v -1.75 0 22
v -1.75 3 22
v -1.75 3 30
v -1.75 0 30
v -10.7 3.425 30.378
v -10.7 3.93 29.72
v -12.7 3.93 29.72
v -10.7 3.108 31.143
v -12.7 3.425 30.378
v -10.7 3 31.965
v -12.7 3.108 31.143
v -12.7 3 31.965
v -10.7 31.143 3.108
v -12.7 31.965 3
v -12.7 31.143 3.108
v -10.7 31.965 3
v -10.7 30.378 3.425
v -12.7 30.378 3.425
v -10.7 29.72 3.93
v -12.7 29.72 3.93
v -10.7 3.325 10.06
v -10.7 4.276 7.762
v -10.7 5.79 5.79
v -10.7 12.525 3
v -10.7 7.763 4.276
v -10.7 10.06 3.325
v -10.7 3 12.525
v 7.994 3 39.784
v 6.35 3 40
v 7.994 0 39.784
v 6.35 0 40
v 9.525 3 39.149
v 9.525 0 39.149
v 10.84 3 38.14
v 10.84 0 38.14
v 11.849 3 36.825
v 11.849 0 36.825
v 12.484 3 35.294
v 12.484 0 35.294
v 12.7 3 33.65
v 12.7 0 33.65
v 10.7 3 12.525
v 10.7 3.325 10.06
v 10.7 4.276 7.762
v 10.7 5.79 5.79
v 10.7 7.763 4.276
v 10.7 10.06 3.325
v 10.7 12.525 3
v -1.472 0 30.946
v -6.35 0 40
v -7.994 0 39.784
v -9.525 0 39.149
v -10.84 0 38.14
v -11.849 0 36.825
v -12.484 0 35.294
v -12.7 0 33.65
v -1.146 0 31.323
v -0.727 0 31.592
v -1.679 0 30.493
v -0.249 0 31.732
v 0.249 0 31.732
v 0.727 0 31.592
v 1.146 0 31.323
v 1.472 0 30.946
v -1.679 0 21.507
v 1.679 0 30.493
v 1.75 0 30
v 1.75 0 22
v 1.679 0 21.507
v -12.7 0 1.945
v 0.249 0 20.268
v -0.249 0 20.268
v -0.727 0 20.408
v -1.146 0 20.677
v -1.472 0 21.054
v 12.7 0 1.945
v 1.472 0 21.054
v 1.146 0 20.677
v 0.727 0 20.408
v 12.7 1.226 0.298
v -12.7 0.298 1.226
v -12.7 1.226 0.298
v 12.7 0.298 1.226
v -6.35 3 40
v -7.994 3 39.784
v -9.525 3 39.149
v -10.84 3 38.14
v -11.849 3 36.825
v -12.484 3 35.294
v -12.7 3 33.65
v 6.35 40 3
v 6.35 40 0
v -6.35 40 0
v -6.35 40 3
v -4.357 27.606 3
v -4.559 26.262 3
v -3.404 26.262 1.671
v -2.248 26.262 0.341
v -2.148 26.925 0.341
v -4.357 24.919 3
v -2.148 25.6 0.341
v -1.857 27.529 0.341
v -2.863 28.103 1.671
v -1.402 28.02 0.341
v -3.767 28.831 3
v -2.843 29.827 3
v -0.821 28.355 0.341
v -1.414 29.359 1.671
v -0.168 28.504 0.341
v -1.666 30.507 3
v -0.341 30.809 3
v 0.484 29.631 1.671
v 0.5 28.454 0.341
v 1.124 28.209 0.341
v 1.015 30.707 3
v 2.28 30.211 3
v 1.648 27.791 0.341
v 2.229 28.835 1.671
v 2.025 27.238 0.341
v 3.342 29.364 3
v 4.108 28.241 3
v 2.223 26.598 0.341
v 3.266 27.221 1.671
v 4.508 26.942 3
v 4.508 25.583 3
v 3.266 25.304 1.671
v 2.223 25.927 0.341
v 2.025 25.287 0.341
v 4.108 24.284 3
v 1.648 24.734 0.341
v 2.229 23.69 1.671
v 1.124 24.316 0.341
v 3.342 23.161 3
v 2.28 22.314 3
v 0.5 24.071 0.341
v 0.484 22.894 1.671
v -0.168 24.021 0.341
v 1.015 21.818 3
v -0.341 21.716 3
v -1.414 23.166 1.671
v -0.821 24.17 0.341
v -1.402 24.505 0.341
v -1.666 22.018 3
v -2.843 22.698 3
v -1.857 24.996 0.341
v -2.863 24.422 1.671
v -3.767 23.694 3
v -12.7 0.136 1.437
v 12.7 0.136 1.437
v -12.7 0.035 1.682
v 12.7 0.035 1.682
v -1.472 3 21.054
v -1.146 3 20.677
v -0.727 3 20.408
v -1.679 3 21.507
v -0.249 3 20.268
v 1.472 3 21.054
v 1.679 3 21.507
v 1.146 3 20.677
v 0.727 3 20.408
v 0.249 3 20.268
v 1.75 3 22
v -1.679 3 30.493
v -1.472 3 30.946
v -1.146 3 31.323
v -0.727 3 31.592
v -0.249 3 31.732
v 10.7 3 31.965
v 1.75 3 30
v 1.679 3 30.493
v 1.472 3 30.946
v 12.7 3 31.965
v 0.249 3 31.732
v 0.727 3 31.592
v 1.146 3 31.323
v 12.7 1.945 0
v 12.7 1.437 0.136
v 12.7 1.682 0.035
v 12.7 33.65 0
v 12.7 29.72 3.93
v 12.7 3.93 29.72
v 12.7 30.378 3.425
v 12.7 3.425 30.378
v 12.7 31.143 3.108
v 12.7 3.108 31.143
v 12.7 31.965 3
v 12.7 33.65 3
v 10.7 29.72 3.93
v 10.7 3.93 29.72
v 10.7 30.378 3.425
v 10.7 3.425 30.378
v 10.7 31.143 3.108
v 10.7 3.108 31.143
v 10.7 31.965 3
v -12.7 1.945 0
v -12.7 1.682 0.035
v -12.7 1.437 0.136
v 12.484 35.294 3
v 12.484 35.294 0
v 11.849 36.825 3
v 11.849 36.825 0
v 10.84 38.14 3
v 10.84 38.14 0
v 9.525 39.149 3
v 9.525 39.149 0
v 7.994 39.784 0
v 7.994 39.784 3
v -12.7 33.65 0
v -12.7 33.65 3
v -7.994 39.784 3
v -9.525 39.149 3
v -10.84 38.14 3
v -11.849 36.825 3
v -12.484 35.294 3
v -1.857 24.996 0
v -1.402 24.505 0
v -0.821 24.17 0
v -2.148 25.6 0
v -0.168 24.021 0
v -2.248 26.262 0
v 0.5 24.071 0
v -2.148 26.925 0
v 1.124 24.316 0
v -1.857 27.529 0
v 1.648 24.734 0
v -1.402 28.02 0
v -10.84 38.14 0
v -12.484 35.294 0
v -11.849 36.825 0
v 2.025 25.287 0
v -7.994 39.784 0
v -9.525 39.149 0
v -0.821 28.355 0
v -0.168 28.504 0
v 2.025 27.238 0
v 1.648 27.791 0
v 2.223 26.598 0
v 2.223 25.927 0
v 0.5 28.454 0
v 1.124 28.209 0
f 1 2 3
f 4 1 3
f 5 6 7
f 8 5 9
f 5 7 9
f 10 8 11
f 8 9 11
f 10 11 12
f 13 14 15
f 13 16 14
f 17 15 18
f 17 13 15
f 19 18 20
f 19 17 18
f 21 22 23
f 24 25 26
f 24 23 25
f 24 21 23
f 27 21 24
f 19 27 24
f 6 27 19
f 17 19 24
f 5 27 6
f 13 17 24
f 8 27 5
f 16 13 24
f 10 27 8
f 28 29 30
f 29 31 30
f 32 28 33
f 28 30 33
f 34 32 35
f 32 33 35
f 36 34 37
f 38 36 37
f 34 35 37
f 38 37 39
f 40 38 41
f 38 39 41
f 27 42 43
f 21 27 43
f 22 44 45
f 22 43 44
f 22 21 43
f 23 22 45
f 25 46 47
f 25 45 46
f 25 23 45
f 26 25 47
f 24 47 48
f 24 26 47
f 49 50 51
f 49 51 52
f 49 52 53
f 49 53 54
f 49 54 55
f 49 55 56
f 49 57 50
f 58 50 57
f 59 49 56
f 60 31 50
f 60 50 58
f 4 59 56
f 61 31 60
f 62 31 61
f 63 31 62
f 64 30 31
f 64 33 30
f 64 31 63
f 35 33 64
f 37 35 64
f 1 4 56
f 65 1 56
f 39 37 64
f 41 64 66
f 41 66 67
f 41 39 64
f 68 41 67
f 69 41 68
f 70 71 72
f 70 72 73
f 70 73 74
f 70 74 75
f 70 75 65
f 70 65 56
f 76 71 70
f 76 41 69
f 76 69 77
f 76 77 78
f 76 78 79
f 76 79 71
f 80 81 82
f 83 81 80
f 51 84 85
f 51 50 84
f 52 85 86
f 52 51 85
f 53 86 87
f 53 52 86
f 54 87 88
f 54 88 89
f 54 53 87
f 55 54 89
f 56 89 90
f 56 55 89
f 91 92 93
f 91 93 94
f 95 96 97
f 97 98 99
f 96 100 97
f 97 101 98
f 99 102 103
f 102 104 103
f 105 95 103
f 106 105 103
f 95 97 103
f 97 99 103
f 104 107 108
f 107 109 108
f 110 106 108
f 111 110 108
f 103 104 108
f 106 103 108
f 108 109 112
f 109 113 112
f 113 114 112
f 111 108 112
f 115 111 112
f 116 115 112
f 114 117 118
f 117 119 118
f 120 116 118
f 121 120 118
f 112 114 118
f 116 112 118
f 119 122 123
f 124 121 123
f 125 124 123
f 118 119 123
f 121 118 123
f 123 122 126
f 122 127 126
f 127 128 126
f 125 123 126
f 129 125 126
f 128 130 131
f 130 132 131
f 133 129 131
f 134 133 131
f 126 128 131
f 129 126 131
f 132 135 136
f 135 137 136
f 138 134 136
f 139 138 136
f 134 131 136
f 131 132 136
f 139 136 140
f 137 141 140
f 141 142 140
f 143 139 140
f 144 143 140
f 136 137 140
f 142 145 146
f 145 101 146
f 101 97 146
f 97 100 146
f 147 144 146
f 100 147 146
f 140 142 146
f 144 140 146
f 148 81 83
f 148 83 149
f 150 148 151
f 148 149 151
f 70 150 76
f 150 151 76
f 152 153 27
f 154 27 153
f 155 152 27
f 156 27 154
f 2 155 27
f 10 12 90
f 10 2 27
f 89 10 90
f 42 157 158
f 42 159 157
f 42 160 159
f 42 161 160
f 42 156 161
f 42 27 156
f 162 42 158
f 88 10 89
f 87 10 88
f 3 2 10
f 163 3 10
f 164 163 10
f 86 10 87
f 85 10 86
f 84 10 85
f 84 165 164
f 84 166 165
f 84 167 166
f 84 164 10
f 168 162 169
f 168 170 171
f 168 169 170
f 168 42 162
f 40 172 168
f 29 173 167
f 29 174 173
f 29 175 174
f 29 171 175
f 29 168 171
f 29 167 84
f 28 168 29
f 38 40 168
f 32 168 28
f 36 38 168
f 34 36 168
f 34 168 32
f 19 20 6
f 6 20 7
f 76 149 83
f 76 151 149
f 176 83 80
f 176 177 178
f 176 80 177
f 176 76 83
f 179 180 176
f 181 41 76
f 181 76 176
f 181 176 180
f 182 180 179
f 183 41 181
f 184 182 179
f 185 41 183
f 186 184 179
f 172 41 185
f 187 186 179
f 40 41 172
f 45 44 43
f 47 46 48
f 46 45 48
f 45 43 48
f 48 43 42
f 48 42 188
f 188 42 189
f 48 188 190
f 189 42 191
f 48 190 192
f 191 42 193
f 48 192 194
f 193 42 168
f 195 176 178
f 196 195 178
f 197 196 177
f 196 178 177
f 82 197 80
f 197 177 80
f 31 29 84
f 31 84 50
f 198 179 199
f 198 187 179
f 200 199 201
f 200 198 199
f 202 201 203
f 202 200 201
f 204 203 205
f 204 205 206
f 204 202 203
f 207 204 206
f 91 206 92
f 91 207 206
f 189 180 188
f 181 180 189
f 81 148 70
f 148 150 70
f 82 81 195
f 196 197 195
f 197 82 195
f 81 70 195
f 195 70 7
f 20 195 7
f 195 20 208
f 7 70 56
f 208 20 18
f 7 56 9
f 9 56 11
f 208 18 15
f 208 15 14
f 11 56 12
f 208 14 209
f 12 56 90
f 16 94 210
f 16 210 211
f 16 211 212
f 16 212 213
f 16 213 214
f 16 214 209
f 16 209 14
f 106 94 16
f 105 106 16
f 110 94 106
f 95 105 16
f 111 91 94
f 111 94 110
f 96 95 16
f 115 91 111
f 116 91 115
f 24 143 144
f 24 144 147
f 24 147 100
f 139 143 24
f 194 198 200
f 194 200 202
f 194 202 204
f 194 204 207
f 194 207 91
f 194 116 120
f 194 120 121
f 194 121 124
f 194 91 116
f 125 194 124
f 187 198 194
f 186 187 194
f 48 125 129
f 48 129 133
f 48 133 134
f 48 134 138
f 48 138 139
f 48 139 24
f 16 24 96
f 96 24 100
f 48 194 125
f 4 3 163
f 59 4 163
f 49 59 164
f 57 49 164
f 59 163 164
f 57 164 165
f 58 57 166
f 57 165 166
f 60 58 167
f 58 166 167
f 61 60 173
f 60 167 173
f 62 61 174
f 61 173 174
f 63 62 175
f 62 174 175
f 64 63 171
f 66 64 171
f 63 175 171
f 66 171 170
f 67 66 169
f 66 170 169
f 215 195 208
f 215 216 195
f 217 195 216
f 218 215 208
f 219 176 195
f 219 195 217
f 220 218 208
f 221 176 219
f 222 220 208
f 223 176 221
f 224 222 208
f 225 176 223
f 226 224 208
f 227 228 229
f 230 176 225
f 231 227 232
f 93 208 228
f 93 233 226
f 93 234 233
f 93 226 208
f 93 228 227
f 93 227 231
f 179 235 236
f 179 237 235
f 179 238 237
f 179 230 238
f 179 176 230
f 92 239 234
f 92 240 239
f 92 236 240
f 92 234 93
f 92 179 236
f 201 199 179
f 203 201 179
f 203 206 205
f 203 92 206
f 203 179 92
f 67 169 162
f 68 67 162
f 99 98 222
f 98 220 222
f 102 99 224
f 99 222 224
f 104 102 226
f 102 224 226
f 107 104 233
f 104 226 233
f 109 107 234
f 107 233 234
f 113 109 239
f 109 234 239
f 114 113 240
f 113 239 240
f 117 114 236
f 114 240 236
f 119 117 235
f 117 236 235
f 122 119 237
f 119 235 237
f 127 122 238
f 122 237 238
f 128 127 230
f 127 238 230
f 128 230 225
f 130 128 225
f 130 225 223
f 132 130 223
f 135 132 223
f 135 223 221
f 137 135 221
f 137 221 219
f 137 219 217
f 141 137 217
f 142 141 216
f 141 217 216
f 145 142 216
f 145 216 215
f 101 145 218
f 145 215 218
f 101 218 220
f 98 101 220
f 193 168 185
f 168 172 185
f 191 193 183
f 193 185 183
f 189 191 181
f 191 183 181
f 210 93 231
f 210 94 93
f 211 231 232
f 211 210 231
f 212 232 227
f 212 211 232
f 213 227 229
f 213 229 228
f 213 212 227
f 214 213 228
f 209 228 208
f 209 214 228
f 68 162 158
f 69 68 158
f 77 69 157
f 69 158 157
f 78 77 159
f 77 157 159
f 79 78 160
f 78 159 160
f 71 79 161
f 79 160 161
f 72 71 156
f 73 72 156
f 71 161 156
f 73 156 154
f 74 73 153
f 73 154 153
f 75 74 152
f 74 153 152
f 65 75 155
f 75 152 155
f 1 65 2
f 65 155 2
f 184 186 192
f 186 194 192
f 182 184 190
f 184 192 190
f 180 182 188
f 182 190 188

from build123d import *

# Parameters (mm, degrees)
F1_DEPTH        = 12.7
F2_R            = 9.525
F3_SIZE         = 1.524
F4_R            = 1.016
F6_DEPTH        = 2
F7_R            = 6.35
F8_R            = 3.175
F10_DEPTH       = 3.001
F12_D           = 4.4958
F12_DEPTH       = 25.4
F12_CSINK_D     = 9.1186
F12_CSINK_ANGLE = 82
F12_TIP         = 1.3506745855


# Not quite as in the source:
# - a pattern or mirror of a feature is missing from the dataset's text; its kind, count and spacing are read off the source's solid


with BuildPart() as f1:
    # F0 (on Right) → F1 (new body, symmetric)
    with BuildSketch(Plane.YZ):
        Polygon((3, 40), (0, 40), (0, 0), (40, 0), (40, 3), (3, 3), align=None)
    extrude(amount=F1_DEPTH, both=True)

    # F2
    f2_edges = [f1.edges().sort_by_distance(p)[0] for p in [
        (0, 3, 3),
    ]]
    fillet(f2_edges, radius=F2_R)

    # F3
    f3_edges = [f1.edges().sort_by_distance(p)[0] for p in [
        (0, 0, 0),
    ]]
    chamfer(f3_edges, length=F3_SIZE)

    # F4
    f4_edges = [f1.edges().sort_by_distance(p)[0] for p in [
        (0, 0, 1.524),
        (0, 1.524, 0),
    ]]
    fillet(f4_edges, radius=F4_R)

    # F5 (on face) → F6 (join)
    with BuildSketch(Plane.YZ.offset(12.7)):
        with BuildLine():
            Line((33.65, 0), (0, 33.65))
            Line((0, 33.65), (0, 1.9448409794))
            ThreePointArc((0, 1.9448409794), (0.077338395, 1.5560346121), (0.2975795103, 1.2264204897))
            Line((0.2975795103, 1.2264204897), (1.2264204897, 0.2975795103))
            ThreePointArc((1.2264204897, 0.2975795103), (1.5560346121, 0.077338395), (1.9448409794, 0))
            Line((1.9448409794, 0), (33.65, 0))
        make_face()
    f6 = extrude(amount=-F6_DEPTH)

    # F6_copies: F6 across plane
    add(f6.mirror(Plane(origin=(0, 0, 0), x_dir=(0, 0, -1), z_dir=(-1, 0, 0))))

    # F7
    f7_edges = [f1.edges().sort_by_distance(p)[0] for p in [
        (12.7, 1.5, 40),
        (-12.7, 1.5, 40),
        (-12.7, 40, 1.5),
        (12.7, 40, 1.5),
    ]]
    fillet(f7_edges, radius=F7_R)

    # F8
    f8_edges = [f1.edges().sort_by_distance(p)[0] for p in [
        (11.7, 3, 30.65),
        (11.7, 30.65, 3),
        (-11.7, 30.65, 3),
        (-11.7, 3, 30.65),
    ]]
    fillet(f8_edges, radius=F8_R)

    # F9 (on face) → F10 (cut, through all)
    with BuildSketch(Plane(origin=(0, 3, 0), x_dir=(-1, 0, 0), z_dir=(0, 1, 0))):
        with BuildLine():
            Line((1.75, 22), (1.75, 30))
            ThreePointArc((1.75, 30), (0, 28.25), (-1.75, 30))
            Line((-1.75, 30), (-1.75, 22))
            ThreePointArc((-1.75, 22), (0, 23.75), (1.75, 22))
        make_face()
        with BuildLine():
            ThreePointArc((-1.75, 30), (0, 28.25), (1.75, 30))
            ThreePointArc((1.75, 30), (0, 31.75), (-1.75, 30))
        make_face()
        with BuildLine():
            ThreePointArc((-1.75, 22), (0, 20.25), (1.75, 22))
            ThreePointArc((1.75, 22), (0, 23.75), (-1.75, 22))
        make_face()
    extrude(amount=-F10_DEPTH, mode=Mode.SUBTRACT)

    # F12
    with Locations(Plane.XY.offset(3)):
        with Locations((0, 26.2625)):
            CounterSinkHole(F12_D / 2, F12_CSINK_D / 2, depth=F12_DEPTH, counter_sink_angle=F12_CSINK_ANGLE)
            with Locations((0, 0, -(F12_DEPTH + F12_TIP / 2))):  # 118° drill point
                Cone(0, F12_D / 2, F12_TIP, mode=Mode.SUBTRACT)


solid = f1.part
